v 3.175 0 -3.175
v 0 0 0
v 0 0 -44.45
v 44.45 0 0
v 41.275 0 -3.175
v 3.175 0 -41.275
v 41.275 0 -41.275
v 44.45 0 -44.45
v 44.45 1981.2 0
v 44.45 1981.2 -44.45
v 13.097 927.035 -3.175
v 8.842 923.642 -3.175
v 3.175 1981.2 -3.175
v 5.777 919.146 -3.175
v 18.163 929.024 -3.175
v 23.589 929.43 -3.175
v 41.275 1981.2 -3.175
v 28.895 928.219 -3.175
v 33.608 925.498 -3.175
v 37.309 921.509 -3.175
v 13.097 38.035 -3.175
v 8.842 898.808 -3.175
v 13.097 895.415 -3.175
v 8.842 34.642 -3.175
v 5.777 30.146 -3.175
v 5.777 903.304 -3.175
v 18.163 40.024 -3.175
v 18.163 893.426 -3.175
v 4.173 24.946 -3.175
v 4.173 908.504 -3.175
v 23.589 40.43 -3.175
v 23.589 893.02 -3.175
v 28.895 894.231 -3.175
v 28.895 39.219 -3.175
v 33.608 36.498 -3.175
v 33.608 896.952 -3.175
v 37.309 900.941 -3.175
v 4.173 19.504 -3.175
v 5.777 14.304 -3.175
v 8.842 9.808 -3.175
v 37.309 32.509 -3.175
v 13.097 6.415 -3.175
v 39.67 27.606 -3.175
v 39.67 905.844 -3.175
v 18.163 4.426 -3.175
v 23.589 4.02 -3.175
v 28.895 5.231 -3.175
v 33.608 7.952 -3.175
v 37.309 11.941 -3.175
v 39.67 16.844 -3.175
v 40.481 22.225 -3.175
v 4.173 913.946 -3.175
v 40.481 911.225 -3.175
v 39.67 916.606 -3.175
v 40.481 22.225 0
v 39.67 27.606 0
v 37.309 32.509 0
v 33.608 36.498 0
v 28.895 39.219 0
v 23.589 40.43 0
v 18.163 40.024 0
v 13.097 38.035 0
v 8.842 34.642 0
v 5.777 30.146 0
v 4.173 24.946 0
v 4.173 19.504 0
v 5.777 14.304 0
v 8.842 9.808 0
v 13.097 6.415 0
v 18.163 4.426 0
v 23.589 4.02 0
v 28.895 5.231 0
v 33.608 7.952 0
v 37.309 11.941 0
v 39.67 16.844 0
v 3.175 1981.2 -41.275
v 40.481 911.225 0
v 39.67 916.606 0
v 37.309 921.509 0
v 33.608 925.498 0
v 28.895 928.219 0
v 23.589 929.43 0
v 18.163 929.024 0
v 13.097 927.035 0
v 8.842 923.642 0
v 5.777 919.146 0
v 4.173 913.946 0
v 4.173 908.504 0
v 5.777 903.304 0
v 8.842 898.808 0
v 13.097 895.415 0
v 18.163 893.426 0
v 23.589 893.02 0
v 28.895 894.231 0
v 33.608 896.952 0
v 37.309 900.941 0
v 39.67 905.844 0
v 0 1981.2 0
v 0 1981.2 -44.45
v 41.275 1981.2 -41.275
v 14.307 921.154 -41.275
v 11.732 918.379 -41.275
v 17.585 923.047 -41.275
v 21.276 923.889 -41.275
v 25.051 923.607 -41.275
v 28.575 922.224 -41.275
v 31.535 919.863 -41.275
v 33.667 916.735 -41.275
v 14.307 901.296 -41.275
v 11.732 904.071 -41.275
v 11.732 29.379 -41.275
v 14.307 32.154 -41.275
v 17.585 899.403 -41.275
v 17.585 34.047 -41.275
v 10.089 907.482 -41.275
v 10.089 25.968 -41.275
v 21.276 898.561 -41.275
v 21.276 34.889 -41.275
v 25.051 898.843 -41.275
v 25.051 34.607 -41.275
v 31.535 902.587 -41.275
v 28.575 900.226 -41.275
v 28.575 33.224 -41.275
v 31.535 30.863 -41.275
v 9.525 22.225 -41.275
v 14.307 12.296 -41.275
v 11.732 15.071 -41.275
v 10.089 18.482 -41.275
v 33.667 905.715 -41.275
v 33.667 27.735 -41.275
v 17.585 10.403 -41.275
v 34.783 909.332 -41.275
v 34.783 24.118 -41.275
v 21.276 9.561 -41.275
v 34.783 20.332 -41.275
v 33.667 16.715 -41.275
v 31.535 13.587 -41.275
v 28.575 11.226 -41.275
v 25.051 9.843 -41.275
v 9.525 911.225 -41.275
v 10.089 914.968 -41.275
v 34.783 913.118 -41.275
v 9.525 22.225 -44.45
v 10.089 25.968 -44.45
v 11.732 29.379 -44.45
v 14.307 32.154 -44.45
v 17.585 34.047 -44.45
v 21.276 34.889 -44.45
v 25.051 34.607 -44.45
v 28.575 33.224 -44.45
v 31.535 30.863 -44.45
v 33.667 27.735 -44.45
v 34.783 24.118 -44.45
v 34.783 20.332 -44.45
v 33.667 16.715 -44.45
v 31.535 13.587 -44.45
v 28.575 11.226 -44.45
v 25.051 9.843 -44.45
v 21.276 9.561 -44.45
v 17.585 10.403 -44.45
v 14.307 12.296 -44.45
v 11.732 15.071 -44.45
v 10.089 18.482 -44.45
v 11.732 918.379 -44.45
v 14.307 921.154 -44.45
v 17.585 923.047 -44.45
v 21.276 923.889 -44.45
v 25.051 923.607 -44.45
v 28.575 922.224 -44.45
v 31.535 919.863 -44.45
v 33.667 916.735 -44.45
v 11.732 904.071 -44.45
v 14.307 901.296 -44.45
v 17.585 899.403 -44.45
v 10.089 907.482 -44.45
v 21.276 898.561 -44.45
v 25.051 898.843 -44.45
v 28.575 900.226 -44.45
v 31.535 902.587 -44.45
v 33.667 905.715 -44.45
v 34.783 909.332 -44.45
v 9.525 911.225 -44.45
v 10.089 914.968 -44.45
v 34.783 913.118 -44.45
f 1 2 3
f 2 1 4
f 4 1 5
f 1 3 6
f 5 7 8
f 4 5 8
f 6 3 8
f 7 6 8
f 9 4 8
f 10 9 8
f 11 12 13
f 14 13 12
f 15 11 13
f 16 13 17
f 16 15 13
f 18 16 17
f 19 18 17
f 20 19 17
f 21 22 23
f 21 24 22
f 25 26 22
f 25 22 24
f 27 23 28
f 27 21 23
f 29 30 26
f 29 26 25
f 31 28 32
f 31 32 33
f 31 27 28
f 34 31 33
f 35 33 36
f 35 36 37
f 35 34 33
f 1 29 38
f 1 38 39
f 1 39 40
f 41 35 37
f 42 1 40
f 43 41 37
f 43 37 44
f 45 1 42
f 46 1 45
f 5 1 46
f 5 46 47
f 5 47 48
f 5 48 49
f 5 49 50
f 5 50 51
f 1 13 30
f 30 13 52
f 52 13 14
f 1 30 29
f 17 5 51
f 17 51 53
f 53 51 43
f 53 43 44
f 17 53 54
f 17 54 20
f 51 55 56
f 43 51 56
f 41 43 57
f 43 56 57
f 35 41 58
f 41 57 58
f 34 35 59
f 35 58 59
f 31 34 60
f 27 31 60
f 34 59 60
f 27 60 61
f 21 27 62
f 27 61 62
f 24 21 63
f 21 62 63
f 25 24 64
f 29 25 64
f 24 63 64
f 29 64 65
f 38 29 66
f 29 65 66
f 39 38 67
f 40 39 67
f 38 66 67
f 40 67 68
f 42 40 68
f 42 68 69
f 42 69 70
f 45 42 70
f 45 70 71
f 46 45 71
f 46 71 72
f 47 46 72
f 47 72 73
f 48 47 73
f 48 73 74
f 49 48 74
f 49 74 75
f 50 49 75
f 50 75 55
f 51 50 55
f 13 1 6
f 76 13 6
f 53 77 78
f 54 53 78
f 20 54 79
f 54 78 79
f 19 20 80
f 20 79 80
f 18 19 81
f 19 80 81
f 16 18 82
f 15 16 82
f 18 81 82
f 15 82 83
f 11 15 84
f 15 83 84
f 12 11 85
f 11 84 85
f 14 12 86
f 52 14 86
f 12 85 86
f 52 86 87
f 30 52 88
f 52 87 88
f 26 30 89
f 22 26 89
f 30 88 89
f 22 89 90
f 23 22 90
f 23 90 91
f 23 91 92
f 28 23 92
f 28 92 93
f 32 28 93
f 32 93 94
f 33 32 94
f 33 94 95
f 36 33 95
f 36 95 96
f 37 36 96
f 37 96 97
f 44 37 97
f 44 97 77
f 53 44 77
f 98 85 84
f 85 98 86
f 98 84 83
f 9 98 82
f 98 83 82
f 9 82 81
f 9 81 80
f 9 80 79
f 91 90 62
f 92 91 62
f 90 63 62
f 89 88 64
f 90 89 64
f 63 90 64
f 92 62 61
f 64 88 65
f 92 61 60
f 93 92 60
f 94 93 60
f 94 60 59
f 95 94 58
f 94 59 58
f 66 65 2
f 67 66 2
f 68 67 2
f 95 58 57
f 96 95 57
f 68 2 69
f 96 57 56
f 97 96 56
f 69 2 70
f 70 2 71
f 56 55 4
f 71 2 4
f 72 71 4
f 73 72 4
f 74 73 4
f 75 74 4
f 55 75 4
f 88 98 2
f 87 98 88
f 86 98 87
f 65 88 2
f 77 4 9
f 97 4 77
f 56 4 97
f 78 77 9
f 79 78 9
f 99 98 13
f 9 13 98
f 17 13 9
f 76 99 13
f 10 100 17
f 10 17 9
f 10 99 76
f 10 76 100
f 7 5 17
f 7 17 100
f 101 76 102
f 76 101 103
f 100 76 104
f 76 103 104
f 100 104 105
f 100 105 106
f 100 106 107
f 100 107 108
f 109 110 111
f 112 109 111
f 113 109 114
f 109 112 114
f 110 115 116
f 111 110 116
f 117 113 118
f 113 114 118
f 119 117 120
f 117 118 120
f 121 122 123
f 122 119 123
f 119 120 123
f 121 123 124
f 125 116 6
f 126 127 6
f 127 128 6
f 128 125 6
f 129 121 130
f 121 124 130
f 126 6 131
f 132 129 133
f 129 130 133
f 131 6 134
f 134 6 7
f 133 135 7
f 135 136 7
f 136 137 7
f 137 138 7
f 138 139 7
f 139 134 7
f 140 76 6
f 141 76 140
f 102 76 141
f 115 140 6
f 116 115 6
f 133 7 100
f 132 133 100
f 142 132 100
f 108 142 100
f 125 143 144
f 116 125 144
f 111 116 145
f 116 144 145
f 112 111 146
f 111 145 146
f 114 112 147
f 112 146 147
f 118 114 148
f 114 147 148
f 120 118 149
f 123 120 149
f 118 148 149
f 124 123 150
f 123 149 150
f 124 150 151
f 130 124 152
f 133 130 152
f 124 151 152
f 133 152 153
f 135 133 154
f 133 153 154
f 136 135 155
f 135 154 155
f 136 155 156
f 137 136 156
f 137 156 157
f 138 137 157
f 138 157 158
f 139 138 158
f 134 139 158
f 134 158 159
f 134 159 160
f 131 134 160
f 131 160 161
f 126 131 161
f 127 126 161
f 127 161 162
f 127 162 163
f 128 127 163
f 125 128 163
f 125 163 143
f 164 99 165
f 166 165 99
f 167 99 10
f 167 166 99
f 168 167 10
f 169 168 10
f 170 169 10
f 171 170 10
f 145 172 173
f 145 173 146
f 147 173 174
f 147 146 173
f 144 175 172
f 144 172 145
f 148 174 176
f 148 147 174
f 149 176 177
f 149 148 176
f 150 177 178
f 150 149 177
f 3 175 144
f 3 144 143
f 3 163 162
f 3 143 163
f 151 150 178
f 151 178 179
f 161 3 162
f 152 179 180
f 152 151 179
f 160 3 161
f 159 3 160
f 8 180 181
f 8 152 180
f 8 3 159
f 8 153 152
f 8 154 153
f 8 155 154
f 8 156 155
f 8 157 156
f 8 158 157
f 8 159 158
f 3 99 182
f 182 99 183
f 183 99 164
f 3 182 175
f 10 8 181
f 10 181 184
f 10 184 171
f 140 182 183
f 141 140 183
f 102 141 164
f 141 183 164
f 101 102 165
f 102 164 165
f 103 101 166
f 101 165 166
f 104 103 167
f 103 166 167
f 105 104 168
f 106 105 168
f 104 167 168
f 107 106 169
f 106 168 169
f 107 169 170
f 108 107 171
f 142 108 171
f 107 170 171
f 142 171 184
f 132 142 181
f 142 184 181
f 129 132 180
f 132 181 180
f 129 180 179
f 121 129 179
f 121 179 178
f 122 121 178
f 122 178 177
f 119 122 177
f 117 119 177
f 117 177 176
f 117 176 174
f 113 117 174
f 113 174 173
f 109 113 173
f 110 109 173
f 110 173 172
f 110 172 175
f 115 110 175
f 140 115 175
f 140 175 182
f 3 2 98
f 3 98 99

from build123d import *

# Parameters (mm, degrees)
SKETCH1_W           = 44.45
SKETCH1_H           = 44.45
SKETCH1_W_2         = 38.1
SKETCH1_H_2         = 38.1
BOSS_EXTRUDE1_DEPTH = 1981.2
CUT_EXTRUDE1_REACH  = 46.45
SKETCH2_R           = 18.25625
CUT_EXTRUDE2_REACH  = 46.45
SKETCH4_R           = 12.7


with BuildPart() as part:
    # Sketch1 → Boss-Extrude1 (new body)
    with BuildSketch(Plane(origin=(0, 0, 0), x_dir=(1, 0, 0), z_dir=(0, 1, 0))):
        with Locations((22.225, 22.225)):
            Rectangle(SKETCH1_W, SKETCH1_H)
        with Locations((22.225, 22.225)):
            Rectangle(SKETCH1_W_2, SKETCH1_H_2, mode=Mode.SUBTRACT)
    extrude(amount=BOSS_EXTRUDE1_DEPTH)

    # Sketch2 → Cut-Extrude1 (cut, up to next)
    with BuildSketch(Plane.XY, mode=Mode.PRIVATE) as cut_extrude1_sk1:
        with Locations((22.225, 22.225)):
            Circle(SKETCH2_R)
    cut_extrude1_tool1 = extrude(cut_extrude1_sk1.sketch, amount=-CUT_EXTRUDE1_REACH, mode=Mode.PRIVATE) & part.part
    add(cut_extrude1_tool1.solids().sort_by_distance((22.225, 22.225, 0))[0], mode=Mode.SUBTRACT)
    # Sketch2 → Cut-Extrude1 (cut, up to next)
    with BuildSketch(Plane.XY, mode=Mode.PRIVATE) as cut_extrude1_sk2:
        with Locations((22.225, 911.225)):
            Circle(SKETCH2_R)
    cut_extrude1_tool2 = extrude(cut_extrude1_sk2.sketch, amount=-CUT_EXTRUDE1_REACH, mode=Mode.PRIVATE) & part.part
    add(cut_extrude1_tool2.solids().sort_by_distance((22.225, 911.225, 0))[0], mode=Mode.SUBTRACT)

    # Sketch4 → Cut-Extrude2 (cut, up to next)
    with BuildSketch(Plane(origin=(0, 0, -44.45), x_dir=(-1, 0, 0), z_dir=(0, 0, -1)), mode=Mode.PRIVATE) as cut_extrude2_sk1:
        with Locations((-22.225, 911.225)):
            Circle(SKETCH4_R)
    cut_extrude2_tool1 = extrude(cut_extrude2_sk1.sketch, amount=-CUT_EXTRUDE2_REACH, mode=Mode.PRIVATE) & part.part
    add(cut_extrude2_tool1.solids().sort_by_distance((22.225, 911.225, -44.45))[0], mode=Mode.SUBTRACT)
    # Sketch4 → Cut-Extrude2 (cut, up to next)
    with BuildSketch(Plane(origin=(0, 0, -44.45), x_dir=(-1, 0, 0), z_dir=(0, 0, -1)), mode=Mode.PRIVATE) as cut_extrude2_sk2:
        with Locations((-22.225, 22.225)):
            Circle(SKETCH4_R)
    cut_extrude2_tool2 = extrude(cut_extrude2_sk2.sketch, amount=-CUT_EXTRUDE2_REACH, mode=Mode.PRIVATE) & part.part
    add(cut_extrude2_tool2.solids().sort_by_distance((22.225, 22.225, -44.45))[0], mode=Mode.SUBTRACT)


solid = part.part
